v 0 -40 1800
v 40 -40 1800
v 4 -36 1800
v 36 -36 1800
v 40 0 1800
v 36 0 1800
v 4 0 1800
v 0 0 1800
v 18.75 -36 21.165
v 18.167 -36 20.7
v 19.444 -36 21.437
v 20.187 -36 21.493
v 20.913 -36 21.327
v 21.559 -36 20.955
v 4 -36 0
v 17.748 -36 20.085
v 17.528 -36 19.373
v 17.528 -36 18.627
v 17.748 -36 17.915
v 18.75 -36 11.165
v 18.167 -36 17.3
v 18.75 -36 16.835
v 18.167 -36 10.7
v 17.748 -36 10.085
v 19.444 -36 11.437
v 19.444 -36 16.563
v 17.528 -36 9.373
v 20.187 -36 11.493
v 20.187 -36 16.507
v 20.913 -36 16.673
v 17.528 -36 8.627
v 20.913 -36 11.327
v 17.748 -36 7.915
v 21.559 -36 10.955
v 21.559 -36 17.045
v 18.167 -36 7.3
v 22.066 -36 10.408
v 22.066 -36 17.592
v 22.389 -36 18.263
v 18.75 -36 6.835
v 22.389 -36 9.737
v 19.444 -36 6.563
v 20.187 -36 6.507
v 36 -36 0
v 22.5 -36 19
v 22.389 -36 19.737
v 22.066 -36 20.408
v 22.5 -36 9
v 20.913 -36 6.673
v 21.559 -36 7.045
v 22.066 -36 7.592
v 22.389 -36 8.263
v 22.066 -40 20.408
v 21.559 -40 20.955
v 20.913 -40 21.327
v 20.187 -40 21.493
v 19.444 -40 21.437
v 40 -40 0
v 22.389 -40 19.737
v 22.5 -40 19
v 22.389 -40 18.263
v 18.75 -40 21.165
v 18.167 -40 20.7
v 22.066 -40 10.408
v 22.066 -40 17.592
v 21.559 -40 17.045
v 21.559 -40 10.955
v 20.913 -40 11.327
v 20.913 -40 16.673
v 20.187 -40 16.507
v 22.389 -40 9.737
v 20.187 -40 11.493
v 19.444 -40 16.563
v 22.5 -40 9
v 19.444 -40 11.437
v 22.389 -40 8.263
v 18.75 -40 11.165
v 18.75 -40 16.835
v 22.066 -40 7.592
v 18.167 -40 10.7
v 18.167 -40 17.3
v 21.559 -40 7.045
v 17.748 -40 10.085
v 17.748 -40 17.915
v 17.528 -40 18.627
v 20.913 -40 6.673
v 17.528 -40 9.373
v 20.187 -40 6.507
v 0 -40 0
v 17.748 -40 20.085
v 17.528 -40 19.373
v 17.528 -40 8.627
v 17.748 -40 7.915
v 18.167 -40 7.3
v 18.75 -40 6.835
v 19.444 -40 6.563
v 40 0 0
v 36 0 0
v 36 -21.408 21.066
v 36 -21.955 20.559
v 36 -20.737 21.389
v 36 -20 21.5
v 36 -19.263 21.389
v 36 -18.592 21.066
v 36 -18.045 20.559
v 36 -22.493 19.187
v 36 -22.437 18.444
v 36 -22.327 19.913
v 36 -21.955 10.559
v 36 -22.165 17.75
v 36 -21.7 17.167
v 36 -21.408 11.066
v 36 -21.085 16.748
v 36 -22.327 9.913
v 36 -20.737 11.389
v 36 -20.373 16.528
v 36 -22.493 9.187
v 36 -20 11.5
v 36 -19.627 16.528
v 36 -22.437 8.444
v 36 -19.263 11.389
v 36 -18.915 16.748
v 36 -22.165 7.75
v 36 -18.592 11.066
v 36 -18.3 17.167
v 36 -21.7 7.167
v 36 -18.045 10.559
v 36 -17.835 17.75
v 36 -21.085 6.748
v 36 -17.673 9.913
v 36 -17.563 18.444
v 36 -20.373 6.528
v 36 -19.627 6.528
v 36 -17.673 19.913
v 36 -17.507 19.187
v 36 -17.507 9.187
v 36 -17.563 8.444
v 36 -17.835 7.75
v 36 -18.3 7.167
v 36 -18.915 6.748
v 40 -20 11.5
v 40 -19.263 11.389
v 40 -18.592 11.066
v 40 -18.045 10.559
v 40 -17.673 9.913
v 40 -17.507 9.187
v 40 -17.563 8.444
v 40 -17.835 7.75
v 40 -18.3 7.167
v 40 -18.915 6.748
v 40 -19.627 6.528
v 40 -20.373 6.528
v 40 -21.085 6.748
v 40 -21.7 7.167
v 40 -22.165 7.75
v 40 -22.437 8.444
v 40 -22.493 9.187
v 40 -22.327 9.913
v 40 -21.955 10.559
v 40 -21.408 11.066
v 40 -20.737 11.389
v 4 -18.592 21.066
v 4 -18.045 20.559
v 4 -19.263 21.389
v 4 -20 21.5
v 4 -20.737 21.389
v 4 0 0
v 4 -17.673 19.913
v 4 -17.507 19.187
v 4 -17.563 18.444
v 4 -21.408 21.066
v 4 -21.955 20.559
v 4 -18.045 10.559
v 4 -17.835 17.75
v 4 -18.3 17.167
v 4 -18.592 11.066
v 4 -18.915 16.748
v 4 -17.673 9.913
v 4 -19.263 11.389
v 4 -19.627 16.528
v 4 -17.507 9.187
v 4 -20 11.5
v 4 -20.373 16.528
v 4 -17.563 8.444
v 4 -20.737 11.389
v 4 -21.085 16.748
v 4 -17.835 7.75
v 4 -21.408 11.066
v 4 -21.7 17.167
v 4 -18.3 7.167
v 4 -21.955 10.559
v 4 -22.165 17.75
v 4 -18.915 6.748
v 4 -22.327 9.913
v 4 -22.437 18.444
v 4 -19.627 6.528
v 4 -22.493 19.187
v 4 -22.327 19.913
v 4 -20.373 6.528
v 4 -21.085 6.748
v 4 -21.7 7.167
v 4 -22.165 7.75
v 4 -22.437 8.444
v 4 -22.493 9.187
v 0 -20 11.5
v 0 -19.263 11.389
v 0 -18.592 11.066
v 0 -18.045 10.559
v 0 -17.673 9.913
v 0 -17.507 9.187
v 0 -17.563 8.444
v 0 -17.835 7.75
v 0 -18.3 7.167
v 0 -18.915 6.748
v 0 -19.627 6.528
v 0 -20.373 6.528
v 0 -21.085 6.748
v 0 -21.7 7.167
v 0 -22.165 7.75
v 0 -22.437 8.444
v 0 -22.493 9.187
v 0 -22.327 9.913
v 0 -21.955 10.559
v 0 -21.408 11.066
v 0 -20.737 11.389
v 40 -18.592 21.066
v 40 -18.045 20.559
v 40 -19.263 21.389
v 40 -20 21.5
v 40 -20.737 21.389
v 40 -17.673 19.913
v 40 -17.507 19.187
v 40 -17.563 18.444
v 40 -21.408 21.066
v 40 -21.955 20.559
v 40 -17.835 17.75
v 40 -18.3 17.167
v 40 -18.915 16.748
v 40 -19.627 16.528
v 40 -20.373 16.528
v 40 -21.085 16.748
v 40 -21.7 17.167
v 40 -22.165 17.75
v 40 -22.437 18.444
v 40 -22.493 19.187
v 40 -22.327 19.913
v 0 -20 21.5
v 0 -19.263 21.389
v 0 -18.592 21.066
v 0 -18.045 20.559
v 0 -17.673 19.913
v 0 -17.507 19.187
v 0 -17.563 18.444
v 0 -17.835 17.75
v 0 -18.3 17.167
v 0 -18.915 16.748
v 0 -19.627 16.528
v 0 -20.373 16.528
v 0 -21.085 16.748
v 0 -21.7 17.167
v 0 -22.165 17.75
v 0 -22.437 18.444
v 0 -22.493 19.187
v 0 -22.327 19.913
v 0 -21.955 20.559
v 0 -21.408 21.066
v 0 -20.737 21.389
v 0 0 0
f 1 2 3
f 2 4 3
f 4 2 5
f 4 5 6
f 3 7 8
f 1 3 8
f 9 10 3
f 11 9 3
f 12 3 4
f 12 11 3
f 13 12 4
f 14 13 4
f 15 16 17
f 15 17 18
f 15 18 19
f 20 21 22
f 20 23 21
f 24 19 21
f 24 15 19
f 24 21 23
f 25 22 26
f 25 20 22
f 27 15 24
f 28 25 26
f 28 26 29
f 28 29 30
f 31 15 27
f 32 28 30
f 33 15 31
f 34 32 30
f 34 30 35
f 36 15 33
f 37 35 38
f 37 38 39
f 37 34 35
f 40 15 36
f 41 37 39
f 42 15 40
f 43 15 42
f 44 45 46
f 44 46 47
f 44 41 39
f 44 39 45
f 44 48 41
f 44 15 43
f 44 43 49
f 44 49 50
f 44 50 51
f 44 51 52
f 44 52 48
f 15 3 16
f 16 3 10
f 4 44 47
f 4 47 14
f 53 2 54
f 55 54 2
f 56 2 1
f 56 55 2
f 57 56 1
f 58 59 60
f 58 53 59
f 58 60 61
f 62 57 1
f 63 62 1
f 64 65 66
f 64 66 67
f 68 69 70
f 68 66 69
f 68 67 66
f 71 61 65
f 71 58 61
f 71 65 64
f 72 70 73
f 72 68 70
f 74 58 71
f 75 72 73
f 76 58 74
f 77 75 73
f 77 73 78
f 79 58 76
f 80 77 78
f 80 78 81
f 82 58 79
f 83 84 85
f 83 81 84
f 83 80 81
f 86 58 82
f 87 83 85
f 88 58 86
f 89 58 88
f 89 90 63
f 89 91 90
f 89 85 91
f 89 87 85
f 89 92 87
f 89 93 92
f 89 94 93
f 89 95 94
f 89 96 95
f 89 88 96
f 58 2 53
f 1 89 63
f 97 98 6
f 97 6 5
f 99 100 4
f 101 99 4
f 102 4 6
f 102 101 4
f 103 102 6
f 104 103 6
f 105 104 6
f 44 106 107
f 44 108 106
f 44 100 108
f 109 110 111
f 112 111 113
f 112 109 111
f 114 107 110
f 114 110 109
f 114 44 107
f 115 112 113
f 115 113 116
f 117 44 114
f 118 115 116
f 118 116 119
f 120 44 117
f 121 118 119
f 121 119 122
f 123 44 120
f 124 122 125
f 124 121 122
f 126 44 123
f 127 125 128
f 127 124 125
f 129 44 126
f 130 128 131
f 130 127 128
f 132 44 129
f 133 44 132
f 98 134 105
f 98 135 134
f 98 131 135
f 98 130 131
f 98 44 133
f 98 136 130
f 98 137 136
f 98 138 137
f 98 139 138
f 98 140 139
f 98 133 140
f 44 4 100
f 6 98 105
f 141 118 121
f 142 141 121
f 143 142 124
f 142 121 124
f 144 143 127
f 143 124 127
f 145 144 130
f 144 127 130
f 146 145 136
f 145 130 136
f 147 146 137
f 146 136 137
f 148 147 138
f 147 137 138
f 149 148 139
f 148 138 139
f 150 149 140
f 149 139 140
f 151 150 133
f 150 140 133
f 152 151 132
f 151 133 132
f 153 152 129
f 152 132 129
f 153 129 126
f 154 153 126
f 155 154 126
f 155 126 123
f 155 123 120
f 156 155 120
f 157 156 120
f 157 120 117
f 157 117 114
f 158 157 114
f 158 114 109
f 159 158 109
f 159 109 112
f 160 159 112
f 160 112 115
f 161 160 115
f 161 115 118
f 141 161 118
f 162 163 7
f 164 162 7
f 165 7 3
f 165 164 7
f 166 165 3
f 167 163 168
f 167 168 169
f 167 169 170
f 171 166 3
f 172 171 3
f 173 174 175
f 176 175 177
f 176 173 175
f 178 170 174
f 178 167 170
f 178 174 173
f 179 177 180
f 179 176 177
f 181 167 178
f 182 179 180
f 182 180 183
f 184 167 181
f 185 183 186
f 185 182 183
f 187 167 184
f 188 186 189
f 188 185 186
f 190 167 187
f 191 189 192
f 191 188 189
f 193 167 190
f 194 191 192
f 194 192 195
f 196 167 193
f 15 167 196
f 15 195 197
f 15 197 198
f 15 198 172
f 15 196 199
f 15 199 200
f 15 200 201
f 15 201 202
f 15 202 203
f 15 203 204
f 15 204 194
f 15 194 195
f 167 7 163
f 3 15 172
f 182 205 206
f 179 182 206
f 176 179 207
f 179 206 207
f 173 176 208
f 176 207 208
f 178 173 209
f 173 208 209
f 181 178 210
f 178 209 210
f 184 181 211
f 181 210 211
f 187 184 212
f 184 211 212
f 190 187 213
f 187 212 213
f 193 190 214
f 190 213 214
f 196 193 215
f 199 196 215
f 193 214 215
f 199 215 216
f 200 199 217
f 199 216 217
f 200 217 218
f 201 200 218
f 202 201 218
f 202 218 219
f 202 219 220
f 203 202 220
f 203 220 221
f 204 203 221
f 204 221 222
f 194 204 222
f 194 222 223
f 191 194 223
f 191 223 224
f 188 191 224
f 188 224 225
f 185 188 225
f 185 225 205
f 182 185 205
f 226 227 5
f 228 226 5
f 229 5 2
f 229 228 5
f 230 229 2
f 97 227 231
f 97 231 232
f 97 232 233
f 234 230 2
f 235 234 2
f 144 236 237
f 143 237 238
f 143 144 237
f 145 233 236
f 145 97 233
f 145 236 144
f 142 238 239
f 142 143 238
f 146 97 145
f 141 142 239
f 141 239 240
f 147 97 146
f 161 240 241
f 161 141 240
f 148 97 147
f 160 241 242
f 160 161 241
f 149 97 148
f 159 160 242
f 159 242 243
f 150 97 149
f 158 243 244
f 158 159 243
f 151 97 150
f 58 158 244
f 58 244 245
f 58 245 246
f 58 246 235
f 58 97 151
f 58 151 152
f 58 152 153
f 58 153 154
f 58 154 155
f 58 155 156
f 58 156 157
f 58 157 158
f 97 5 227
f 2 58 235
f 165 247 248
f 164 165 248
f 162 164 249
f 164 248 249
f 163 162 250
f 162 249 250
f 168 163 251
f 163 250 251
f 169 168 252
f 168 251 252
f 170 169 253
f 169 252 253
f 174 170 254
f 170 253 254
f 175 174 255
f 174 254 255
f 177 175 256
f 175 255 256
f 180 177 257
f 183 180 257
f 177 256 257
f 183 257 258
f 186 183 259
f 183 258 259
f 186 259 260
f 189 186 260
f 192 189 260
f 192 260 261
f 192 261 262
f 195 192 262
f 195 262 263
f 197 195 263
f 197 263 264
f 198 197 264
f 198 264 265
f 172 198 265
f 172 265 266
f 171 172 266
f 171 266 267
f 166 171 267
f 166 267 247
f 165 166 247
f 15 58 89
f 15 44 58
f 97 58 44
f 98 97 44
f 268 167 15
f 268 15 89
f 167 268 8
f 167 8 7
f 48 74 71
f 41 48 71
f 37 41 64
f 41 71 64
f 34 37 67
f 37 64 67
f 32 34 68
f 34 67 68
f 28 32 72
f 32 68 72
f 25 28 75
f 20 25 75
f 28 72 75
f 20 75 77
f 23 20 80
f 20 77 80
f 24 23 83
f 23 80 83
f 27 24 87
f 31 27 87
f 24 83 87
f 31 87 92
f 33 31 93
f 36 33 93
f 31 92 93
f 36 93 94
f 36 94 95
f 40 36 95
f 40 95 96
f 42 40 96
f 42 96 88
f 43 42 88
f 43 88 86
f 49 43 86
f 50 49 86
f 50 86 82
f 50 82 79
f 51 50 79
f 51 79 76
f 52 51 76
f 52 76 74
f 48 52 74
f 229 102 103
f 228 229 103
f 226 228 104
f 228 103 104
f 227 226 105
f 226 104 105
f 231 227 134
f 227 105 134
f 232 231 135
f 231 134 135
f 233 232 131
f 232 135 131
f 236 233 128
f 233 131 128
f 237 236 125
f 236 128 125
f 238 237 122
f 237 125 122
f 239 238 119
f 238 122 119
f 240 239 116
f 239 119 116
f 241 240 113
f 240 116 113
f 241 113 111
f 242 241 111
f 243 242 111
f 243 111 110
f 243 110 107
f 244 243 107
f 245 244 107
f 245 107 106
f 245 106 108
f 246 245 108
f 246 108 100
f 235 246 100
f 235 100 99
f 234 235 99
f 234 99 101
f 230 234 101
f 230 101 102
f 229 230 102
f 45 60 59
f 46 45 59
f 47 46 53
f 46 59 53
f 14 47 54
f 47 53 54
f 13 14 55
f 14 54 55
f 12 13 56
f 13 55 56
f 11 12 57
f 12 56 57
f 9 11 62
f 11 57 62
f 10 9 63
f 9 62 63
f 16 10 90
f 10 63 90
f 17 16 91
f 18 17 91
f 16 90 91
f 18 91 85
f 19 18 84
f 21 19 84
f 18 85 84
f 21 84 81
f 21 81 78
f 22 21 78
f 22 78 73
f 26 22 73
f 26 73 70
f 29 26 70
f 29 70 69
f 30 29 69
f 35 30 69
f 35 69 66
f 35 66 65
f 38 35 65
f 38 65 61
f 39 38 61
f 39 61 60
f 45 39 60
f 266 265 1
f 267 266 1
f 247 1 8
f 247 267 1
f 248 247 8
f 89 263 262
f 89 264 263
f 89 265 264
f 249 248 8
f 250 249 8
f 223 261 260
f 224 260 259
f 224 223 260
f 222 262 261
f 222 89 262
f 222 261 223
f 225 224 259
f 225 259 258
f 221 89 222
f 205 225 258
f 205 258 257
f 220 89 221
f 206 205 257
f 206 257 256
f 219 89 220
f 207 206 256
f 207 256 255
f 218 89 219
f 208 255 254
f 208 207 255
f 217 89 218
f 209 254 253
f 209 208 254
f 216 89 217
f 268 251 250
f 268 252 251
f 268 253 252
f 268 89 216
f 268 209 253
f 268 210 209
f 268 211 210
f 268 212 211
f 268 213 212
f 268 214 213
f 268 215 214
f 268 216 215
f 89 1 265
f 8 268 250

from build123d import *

# Parameters (mm, degrees)
SALIENTE_EXTRUIR1_DEPTH = 1800
CROQUIS2_R              = 2.5
CORTAR_EXTRUIR1_DEPTH   = 1801.888669518
CROQUIS3_R              = 2.5
CORTAR_EXTRUIR2_DEPTH   = 10


with BuildPart() as part:
    # Croquis1 → Saliente-Extruir1 (new body)
    with BuildSketch(Plane.XY):
        Polygon((0, 0), (4, 0), (4, -36), (36, -36), (36, 0), (40, 0), (40, -40), (0, -40), align=None)
    extrude(amount=SALIENTE_EXTRUIR1_DEPTH)

    # Croquis2 → Cortar-Extruir1 (cut, through all)
    with BuildSketch(Plane.ZY):
        with Locations((9, -20)):
            Circle(CROQUIS2_R)
        with Locations((19, -20)):
            Circle(CROQUIS2_R)
    extrude(amount=-CORTAR_EXTRUIR1_DEPTH, mode=Mode.SUBTRACT)

    # Croquis3 → Cortar-Extruir2 (cut)
    with BuildSketch(Plane(origin=(0, -40, 0), x_dir=(-1, 0, 0), z_dir=(0, -1, 0))):
        with Locations(Location((-20, -9, 0), (0, 0, 180))):
            Circle(CROQUIS3_R)
        with Locations(Location((-20, -19, 0), (0, 0, 180))):
            Circle(CROQUIS3_R)
    extrude(amount=-CORTAR_EXTRUIR2_DEPTH, mode=Mode.SUBTRACT)


solid = part.part
